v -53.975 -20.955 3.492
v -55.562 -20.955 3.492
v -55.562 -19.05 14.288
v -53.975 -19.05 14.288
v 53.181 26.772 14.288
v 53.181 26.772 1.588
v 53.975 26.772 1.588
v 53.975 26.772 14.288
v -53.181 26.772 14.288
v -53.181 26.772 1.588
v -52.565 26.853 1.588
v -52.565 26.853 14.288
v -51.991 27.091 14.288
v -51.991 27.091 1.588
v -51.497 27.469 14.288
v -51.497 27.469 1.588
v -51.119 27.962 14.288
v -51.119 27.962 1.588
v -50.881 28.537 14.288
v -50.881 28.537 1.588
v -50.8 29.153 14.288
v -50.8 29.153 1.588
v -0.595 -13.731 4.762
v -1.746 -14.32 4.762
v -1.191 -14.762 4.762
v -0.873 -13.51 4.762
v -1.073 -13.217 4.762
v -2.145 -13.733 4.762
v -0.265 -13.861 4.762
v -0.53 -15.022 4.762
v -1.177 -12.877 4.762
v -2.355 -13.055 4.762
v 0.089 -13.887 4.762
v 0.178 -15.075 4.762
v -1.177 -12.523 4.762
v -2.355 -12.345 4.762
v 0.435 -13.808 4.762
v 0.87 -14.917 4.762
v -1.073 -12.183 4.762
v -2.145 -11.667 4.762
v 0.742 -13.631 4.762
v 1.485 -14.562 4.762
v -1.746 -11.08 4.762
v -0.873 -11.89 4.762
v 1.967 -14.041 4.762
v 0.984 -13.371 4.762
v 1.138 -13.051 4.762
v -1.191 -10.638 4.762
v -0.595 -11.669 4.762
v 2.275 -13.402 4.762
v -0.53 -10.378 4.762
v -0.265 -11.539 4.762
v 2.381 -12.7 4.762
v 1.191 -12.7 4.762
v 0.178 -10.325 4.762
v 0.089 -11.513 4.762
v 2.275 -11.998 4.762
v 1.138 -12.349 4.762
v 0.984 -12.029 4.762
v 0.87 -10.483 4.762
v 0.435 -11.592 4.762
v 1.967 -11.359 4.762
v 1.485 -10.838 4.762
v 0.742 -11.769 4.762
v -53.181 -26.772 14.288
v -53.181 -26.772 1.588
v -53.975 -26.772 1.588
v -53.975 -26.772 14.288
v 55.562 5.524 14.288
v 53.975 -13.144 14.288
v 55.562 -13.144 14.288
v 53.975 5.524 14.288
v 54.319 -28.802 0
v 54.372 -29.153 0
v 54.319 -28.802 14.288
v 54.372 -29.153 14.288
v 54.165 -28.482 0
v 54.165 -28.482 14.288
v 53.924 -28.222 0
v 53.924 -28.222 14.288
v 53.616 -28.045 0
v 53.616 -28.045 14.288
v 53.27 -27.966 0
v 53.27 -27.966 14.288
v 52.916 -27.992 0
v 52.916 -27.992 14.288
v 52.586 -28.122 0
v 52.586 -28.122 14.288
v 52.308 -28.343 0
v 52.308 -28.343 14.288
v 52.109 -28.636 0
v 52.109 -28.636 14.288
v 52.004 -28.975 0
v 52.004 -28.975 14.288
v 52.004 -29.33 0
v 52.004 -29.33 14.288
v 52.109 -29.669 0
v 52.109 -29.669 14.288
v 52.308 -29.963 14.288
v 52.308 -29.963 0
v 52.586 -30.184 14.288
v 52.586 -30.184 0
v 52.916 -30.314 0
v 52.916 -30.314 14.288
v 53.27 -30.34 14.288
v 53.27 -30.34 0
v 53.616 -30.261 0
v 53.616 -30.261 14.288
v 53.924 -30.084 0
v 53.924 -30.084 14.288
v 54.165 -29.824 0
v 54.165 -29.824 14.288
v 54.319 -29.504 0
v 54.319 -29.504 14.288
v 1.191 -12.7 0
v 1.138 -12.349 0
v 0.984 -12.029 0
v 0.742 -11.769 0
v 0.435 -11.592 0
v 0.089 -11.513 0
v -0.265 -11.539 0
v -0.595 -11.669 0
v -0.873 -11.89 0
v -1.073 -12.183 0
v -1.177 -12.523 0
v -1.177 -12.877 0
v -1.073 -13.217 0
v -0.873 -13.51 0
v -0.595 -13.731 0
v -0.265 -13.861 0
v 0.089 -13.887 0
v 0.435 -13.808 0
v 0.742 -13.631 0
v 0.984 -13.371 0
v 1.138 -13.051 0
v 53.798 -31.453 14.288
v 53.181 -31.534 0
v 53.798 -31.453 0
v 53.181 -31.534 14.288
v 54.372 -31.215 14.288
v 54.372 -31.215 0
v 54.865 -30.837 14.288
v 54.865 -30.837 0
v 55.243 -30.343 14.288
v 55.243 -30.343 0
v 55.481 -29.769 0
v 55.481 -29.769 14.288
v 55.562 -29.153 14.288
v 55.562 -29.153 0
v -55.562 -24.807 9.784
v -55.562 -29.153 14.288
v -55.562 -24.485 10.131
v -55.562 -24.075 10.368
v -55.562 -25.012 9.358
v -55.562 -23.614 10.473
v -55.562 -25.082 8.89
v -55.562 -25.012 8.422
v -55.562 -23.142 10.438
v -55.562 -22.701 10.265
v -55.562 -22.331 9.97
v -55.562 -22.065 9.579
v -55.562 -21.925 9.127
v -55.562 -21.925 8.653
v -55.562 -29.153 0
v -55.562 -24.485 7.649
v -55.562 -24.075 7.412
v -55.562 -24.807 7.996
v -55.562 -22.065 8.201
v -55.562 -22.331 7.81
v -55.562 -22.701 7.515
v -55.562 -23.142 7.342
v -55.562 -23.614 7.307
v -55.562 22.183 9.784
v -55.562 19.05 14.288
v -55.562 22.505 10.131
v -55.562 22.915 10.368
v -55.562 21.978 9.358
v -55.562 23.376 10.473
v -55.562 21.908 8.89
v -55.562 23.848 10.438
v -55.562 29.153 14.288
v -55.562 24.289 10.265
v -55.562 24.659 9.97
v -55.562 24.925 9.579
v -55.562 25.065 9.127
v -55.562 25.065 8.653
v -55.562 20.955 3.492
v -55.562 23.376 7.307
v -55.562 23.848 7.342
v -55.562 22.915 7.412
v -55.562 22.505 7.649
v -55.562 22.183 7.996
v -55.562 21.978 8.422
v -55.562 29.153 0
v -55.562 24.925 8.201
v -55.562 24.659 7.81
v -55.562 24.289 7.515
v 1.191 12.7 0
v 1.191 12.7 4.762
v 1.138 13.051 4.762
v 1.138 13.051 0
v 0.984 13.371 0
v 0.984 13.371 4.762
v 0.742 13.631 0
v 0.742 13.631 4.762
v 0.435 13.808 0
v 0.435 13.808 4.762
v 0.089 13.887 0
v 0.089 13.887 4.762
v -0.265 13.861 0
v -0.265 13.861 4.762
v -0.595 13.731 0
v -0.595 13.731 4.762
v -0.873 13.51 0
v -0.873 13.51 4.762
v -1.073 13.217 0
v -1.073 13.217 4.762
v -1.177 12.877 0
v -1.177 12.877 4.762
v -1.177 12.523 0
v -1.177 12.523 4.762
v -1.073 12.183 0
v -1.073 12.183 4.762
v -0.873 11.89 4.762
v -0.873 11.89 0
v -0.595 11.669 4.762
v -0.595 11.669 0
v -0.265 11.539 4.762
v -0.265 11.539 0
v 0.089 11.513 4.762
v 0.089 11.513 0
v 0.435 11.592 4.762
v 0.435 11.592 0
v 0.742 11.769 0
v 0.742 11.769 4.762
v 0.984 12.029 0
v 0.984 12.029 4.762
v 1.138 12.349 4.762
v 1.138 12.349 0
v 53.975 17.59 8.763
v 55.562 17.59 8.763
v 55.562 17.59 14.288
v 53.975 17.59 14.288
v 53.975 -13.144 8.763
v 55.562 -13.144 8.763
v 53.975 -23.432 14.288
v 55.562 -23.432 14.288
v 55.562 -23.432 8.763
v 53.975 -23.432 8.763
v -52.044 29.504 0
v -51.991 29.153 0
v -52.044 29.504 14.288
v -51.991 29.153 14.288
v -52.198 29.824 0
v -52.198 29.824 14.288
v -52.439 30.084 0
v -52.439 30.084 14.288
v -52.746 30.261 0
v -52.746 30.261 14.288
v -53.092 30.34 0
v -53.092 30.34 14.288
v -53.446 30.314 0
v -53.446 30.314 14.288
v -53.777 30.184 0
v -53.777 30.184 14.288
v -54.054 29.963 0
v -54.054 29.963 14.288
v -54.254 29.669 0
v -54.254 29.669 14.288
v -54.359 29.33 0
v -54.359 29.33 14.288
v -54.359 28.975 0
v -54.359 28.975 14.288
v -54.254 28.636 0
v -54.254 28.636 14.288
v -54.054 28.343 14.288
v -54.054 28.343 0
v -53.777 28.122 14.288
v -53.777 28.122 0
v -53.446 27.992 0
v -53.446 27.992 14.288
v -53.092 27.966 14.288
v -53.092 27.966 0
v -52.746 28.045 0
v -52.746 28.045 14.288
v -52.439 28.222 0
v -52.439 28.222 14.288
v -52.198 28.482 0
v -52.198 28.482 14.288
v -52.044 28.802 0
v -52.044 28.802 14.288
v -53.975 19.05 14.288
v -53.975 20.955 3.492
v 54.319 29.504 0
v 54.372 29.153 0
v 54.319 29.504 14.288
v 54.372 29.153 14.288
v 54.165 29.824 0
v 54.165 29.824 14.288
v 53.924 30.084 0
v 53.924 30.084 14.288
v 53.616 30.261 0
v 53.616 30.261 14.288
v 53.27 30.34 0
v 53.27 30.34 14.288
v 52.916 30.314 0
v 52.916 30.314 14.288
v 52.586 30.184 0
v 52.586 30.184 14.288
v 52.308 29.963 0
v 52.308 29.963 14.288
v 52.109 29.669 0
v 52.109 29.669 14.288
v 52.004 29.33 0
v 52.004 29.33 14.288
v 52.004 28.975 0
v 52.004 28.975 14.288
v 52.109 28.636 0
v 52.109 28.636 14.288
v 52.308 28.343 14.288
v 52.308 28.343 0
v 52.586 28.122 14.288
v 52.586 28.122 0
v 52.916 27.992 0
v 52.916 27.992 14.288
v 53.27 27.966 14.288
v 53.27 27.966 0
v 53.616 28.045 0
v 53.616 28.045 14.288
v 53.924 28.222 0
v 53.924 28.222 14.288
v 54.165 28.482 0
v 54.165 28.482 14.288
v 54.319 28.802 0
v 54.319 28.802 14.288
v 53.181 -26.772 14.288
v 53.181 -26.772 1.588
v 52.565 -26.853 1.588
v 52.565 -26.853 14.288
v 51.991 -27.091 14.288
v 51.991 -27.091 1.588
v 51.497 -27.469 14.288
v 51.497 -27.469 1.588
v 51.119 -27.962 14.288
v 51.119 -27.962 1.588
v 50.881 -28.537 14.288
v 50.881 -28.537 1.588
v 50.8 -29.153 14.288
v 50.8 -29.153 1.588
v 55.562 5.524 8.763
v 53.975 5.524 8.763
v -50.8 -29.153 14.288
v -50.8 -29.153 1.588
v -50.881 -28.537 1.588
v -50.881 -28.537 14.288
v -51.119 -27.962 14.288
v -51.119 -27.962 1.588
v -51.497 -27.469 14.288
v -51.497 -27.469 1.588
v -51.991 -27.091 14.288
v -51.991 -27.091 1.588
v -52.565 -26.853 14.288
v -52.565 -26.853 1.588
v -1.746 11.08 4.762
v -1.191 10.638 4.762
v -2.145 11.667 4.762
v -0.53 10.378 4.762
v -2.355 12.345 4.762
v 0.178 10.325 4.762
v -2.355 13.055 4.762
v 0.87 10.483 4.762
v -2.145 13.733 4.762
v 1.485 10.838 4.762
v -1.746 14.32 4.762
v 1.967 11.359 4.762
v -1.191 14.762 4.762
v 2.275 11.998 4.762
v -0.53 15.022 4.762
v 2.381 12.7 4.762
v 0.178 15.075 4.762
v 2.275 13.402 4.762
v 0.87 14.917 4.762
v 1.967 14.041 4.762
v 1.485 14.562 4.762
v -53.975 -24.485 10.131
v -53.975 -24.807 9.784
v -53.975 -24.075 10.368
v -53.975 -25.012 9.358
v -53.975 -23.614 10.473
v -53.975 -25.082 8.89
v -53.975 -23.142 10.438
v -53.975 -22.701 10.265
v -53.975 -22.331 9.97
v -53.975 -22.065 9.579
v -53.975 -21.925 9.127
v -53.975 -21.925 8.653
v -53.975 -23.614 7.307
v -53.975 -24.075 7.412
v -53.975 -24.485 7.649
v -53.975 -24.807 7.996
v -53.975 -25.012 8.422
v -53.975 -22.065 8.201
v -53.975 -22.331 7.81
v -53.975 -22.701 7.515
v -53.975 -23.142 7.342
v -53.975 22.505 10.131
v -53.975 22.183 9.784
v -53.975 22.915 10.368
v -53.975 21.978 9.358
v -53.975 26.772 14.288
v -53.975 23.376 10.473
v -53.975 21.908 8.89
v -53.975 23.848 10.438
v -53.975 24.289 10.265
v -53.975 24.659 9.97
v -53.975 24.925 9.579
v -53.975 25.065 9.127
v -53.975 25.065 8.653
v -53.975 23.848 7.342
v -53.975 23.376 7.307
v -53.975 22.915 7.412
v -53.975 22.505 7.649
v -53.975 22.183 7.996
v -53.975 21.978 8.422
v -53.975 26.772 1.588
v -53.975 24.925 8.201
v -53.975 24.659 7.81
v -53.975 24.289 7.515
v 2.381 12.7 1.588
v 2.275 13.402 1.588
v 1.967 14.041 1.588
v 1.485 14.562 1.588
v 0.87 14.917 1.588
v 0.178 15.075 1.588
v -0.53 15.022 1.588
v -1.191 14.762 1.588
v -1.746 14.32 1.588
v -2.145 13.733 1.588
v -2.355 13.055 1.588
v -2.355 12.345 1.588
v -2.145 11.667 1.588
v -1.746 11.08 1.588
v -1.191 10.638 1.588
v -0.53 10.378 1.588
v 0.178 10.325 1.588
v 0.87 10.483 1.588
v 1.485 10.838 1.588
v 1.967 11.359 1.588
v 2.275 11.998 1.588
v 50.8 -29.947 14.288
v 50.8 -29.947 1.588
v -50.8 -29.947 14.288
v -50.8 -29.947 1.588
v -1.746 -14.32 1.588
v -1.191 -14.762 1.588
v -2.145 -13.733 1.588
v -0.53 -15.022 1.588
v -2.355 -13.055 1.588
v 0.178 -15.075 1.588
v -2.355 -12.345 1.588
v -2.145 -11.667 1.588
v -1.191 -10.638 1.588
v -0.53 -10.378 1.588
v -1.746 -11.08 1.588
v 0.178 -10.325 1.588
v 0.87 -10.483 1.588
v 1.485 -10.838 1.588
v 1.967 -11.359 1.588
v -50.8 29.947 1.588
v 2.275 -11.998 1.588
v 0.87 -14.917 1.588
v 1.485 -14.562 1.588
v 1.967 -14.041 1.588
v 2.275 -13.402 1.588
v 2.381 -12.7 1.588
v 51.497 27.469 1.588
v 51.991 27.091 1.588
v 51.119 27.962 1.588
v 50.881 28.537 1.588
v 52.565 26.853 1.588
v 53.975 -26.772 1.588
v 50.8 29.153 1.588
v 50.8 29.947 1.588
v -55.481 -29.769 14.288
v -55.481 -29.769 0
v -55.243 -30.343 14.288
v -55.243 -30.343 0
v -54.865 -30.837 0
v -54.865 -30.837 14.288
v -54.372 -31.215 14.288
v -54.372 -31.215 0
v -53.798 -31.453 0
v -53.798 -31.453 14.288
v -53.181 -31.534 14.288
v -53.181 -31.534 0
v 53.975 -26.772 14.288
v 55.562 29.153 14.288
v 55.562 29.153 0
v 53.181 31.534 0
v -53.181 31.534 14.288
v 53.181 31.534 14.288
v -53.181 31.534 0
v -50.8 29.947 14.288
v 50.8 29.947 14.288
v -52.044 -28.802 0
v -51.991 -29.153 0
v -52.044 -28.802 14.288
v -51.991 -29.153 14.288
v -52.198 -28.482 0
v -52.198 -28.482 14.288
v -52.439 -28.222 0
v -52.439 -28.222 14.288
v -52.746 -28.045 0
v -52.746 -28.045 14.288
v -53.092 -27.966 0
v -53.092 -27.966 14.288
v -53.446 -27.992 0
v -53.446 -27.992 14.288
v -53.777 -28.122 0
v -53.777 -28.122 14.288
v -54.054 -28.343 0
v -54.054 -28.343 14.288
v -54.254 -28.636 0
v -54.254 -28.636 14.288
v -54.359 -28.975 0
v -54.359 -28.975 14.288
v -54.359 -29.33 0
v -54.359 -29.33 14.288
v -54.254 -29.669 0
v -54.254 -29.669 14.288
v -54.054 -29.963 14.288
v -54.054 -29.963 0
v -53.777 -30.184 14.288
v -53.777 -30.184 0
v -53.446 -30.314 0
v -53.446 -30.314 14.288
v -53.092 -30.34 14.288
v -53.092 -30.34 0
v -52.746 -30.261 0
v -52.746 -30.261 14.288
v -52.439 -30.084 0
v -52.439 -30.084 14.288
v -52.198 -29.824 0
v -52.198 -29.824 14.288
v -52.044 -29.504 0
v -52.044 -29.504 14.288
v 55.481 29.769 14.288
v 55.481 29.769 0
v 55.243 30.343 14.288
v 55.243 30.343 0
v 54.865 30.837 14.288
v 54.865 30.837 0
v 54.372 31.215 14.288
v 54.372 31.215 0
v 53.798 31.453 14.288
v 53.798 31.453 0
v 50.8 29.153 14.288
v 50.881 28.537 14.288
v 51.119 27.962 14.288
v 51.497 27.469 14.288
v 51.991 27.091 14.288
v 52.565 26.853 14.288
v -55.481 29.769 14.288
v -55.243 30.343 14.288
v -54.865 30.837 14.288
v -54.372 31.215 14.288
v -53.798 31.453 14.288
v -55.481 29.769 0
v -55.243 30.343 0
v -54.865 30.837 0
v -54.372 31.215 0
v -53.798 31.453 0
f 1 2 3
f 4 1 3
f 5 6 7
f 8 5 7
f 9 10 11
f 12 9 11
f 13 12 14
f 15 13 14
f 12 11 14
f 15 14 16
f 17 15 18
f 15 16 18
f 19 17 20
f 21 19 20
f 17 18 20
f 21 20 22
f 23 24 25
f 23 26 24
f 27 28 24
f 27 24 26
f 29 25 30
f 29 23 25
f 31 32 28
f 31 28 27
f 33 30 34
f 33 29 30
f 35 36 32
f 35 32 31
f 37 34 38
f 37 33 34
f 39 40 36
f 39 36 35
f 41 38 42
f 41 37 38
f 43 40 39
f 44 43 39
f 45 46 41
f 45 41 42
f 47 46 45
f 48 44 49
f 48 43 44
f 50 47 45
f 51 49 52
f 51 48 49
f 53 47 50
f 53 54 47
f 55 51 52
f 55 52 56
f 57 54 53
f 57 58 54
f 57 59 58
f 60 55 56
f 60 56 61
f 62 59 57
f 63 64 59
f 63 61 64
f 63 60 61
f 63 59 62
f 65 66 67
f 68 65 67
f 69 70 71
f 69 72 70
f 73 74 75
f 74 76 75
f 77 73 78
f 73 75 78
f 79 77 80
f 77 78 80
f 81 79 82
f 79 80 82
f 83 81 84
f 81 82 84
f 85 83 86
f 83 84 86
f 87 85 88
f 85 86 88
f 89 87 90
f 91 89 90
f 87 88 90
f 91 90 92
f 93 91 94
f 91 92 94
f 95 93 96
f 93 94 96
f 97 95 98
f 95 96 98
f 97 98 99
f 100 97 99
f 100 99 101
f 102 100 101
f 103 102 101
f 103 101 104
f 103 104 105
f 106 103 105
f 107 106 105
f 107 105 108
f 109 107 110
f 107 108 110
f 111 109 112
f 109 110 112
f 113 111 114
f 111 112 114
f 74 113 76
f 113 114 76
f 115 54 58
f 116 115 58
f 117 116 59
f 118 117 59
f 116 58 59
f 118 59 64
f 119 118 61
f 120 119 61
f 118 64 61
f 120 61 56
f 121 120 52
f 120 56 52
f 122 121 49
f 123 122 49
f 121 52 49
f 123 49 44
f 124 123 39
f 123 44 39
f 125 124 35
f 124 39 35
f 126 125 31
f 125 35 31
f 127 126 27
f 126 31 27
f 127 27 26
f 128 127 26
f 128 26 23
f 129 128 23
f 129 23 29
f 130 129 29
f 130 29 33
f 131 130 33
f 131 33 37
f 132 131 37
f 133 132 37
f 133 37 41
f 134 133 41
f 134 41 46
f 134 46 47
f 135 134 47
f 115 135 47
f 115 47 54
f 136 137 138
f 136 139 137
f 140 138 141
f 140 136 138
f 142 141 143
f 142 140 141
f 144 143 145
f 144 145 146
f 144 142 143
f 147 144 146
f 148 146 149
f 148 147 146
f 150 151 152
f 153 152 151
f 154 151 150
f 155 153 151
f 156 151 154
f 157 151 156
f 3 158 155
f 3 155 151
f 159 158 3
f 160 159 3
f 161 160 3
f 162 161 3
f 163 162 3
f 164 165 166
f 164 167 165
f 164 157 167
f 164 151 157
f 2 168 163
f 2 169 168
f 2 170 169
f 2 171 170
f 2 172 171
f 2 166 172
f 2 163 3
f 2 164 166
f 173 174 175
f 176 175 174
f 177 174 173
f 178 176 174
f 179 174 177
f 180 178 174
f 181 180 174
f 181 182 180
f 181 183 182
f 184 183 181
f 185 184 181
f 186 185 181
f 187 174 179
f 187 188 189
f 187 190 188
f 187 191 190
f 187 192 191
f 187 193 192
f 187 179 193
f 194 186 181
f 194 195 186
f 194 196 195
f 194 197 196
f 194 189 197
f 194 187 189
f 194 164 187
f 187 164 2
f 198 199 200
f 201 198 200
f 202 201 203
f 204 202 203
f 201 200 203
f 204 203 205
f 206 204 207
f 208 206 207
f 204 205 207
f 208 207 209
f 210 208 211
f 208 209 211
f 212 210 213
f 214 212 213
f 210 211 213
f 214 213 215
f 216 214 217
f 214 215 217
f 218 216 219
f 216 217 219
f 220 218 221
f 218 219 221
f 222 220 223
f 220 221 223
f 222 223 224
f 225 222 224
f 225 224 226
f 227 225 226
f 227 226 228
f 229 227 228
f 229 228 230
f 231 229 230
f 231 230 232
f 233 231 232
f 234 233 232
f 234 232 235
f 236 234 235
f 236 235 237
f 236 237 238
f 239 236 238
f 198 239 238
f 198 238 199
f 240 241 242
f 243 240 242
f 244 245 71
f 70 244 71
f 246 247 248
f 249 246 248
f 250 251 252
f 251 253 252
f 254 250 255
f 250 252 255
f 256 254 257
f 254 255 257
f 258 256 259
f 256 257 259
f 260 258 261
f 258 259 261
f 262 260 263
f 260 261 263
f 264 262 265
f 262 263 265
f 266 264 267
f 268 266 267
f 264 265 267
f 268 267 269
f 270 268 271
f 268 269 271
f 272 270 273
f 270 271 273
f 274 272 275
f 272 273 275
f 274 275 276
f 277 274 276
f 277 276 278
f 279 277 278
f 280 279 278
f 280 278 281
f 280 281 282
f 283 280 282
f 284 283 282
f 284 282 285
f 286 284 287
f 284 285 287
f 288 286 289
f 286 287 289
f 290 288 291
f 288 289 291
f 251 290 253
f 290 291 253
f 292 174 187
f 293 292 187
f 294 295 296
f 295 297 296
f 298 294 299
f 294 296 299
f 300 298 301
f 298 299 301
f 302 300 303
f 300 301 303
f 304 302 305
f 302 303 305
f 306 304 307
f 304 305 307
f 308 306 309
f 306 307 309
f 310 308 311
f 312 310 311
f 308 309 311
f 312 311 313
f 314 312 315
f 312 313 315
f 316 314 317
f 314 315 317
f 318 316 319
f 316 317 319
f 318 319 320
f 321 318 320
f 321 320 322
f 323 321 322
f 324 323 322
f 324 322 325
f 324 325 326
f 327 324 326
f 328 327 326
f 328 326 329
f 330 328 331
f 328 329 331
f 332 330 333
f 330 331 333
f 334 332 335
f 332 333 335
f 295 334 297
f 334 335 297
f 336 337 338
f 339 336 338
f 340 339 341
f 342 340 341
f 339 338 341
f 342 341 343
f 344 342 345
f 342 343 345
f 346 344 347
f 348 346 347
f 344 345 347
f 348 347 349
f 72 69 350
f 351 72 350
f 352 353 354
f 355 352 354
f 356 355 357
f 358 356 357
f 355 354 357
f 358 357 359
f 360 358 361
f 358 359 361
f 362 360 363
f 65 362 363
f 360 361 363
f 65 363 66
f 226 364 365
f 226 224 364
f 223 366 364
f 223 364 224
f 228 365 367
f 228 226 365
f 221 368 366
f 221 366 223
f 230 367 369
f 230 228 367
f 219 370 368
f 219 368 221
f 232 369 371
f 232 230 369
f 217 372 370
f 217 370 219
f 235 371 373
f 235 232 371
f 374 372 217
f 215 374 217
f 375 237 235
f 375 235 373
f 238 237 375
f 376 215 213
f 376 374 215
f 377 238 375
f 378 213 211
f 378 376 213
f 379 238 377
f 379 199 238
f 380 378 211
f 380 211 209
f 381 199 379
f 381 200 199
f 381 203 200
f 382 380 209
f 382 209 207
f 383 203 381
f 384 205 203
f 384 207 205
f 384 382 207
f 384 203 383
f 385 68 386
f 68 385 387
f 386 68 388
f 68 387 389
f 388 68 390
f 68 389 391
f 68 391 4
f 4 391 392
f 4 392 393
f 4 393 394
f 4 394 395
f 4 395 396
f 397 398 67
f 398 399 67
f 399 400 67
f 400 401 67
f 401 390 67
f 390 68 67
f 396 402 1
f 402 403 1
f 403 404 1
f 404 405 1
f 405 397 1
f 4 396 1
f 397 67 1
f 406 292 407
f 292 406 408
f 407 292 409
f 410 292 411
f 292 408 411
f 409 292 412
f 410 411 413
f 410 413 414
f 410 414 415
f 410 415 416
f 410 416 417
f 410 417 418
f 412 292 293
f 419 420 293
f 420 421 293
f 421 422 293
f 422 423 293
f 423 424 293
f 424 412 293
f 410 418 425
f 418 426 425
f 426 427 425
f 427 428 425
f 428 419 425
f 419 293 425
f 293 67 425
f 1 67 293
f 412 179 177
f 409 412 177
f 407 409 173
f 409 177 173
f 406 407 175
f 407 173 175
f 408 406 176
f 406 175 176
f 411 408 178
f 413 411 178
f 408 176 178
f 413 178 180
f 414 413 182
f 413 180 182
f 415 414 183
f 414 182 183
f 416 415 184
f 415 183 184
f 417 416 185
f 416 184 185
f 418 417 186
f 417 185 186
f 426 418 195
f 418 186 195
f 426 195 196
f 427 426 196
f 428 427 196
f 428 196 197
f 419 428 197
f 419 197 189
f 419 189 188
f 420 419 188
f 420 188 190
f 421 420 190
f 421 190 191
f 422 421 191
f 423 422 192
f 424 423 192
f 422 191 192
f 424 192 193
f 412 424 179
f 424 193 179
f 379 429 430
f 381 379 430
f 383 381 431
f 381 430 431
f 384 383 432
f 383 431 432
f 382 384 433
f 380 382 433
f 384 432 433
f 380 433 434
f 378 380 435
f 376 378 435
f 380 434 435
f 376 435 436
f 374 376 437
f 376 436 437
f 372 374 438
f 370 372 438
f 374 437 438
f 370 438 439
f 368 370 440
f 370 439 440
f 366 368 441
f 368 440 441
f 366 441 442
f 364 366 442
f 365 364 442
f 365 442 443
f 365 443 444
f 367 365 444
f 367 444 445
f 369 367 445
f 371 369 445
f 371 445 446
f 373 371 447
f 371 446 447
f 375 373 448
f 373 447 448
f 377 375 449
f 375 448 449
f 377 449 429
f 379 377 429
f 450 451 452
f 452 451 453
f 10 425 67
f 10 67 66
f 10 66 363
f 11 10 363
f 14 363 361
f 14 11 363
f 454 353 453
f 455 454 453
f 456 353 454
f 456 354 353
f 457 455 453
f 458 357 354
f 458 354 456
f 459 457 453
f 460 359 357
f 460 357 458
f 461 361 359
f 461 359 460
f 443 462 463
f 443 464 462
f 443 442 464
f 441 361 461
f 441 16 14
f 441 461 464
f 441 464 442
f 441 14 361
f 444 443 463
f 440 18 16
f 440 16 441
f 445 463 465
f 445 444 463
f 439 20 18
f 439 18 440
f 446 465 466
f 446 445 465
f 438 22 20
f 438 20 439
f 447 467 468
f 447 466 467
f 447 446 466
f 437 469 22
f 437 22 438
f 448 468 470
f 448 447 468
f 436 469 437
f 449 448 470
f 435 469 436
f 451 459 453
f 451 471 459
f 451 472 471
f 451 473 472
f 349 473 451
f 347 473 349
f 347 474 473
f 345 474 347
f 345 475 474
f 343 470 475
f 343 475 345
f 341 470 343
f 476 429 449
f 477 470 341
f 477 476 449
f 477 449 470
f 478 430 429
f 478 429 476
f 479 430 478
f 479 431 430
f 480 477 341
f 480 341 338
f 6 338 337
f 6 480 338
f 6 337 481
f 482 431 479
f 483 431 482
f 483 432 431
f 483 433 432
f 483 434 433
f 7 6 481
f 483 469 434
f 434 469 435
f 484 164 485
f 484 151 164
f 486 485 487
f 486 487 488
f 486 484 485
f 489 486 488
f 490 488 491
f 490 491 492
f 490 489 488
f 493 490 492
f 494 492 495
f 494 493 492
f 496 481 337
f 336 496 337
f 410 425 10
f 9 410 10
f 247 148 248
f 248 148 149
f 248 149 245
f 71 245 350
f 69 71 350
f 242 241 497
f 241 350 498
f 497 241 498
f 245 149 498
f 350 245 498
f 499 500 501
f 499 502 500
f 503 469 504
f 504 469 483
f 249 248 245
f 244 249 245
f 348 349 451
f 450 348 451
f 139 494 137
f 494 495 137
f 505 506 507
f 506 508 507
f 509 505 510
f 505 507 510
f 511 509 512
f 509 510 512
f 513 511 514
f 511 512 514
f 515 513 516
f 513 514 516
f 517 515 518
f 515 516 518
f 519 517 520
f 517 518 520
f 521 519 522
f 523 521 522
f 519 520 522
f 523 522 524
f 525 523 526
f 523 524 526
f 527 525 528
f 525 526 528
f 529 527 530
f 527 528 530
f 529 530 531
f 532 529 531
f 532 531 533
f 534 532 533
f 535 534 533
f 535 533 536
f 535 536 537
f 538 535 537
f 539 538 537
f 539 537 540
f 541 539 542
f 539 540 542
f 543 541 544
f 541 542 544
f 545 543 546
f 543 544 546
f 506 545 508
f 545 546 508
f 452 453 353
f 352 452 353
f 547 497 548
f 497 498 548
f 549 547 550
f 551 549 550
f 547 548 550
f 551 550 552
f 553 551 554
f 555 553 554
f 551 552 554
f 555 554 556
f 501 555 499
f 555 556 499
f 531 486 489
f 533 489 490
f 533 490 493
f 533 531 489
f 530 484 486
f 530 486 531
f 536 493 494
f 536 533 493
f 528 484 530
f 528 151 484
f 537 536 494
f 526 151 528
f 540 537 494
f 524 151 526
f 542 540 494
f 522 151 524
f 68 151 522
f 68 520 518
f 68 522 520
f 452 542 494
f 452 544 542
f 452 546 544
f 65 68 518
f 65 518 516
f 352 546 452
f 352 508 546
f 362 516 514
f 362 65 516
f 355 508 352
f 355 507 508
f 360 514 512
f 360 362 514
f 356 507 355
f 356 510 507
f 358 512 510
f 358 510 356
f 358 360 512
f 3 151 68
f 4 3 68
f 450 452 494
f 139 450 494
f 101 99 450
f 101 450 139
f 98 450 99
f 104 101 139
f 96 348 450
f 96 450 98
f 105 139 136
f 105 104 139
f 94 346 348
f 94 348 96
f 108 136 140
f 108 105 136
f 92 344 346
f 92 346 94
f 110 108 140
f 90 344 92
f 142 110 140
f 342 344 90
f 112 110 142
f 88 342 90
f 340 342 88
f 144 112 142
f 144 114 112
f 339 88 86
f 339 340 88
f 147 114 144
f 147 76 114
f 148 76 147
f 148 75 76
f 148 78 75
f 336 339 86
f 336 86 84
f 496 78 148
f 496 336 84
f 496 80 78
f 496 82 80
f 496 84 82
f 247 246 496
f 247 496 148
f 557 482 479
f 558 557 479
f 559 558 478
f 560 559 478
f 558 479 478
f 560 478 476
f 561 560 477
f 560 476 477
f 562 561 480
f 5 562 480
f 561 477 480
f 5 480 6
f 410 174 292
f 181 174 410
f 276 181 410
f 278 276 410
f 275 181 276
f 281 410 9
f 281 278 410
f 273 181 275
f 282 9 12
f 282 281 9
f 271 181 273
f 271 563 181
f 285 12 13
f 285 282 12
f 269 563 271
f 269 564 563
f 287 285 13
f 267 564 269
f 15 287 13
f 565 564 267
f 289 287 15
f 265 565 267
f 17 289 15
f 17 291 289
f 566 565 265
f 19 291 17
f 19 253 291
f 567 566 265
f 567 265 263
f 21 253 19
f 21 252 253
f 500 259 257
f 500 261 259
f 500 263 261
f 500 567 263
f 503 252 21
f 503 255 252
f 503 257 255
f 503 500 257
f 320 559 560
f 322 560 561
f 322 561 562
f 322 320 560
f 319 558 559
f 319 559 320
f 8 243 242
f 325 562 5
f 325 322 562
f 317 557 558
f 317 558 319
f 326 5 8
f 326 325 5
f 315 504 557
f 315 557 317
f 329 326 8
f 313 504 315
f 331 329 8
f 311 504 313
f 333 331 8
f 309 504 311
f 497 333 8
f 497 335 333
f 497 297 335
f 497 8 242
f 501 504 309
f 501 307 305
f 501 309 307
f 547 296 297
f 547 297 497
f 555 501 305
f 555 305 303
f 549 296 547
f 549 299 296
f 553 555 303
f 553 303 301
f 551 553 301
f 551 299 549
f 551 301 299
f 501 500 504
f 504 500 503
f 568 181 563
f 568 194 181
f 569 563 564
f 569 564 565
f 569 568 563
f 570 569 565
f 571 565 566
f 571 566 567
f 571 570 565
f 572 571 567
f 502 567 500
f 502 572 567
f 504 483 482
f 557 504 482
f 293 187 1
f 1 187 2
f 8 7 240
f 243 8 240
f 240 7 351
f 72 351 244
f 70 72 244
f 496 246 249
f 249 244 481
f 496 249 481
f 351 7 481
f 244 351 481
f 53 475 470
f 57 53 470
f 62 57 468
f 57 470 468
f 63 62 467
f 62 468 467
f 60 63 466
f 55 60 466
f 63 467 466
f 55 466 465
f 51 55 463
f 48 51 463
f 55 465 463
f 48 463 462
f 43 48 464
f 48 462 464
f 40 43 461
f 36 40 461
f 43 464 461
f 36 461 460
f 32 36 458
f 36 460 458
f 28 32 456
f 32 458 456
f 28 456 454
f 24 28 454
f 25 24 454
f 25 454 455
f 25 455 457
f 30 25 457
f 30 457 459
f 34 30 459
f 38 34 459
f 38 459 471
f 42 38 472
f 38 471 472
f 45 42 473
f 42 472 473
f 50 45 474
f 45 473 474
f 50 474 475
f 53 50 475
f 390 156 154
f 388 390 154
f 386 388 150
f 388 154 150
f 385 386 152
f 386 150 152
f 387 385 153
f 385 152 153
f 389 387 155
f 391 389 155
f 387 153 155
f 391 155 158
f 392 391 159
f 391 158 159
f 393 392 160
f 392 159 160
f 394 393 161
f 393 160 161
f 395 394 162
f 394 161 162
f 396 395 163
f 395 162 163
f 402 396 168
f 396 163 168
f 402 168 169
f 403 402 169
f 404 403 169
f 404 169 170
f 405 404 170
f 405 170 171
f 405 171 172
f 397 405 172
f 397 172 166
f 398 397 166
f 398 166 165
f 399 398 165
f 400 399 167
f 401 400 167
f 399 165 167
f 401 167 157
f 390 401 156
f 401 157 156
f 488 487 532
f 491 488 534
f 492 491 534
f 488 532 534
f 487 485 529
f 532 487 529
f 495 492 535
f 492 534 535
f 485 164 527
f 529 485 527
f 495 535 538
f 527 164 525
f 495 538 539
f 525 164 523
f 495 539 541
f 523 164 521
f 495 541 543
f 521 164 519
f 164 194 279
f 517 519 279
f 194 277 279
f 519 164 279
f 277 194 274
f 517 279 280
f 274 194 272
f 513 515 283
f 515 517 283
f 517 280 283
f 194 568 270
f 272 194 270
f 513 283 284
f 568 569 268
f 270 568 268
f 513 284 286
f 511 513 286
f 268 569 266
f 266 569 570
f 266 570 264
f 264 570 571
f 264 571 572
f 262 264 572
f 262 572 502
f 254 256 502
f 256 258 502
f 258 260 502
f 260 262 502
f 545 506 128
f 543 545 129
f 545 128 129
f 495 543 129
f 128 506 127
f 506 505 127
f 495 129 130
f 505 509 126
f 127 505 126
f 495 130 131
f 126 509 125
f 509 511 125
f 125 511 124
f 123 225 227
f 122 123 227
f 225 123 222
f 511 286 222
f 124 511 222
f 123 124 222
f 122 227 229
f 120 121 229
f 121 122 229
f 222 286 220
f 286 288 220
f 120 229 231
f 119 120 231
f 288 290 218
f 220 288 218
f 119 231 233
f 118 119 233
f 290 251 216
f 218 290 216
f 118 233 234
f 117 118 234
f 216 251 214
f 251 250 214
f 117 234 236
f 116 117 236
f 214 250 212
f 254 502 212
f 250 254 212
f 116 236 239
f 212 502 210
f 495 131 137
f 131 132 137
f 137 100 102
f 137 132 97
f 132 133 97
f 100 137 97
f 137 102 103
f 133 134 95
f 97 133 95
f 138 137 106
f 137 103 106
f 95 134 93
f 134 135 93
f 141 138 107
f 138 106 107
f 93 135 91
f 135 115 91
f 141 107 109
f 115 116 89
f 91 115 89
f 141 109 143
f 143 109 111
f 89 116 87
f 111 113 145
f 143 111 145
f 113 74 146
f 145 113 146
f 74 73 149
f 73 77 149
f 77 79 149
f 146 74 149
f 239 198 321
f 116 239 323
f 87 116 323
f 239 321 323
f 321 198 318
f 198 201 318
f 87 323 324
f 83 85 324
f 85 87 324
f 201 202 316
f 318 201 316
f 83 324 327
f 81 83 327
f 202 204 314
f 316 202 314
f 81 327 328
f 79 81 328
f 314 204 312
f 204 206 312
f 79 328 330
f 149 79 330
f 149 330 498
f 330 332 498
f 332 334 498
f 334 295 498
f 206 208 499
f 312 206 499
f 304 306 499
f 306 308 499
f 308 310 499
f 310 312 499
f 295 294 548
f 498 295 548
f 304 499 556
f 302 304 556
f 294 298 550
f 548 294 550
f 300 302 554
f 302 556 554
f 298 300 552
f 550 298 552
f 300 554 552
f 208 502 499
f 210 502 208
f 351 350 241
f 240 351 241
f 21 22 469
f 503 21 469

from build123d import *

# Parameters (mm, degrees)
F1_W      = 111.125
F1_H      = 63.0682
F2_DEPTH  = 1.5875
F3_W      = 111.125
F3_H      = 63.0682
F3_R      = 1.190625
F4_DEPTH  = 12.7
F5_R      = 2.38125
F7_DEPTH  = 1.5875
F9_R      = 1.5875
F10_DEPTH = 1.5875
F11_R     = 2.38125
F12_DEPTH = 3.175
F13_R     = 1.190625
F14_DEPTH = 4.7635
F15_R     = 1.190625
F16_DEPTH = 14.2885


with BuildPart() as f2:
    # F1 (on Top) → F2 (new body)
    with BuildSketch(Plane.XY):
        Rectangle(F1_W, F1_H)
    extrude(amount=F2_DEPTH)

    # F3 (on face) → F4 (join)
    with BuildSketch(Plane.XY.offset(1.5875)):
        Rectangle(F3_W, F3_H)
        with Locations((-53.18125, -29.15285)):
            Circle(F3_R, mode=Mode.SUBTRACT)
        with Locations((53.18125, -29.15285)):
            Circle(F3_R, mode=Mode.SUBTRACT)
        with BuildLine():
            Line((53.18125, 26.7716), (53.975, 26.7716))
            Line((53.975, 26.7716), (53.975, -26.7716))
            Line((53.975, -26.7716), (53.18125, -26.7716))
            ThreePointArc((53.18125, -26.7716), (51.497452, -27.469052), (50.8, -29.15285))
            Line((50.8, -29.15285), (50.8, -29.9466))
            Line((50.8, -29.9466), (-50.8, -29.9466))
            Line((-50.8, -29.9466), (-50.8, -29.15285))
            ThreePointArc((-50.8, -29.15285), (-51.497452, -27.469052), (-53.18125, -26.7716))
            Line((-53.18125, -26.7716), (-53.975, -26.7716))
            Line((-53.975, -26.7716), (-53.975, 26.7716))
            Line((-53.975, 26.7716), (-53.18125, 26.7716))
            ThreePointArc((-53.18125, 26.7716), (-51.497452, 27.469052), (-50.8, 29.15285))
            Line((-50.8, 29.15285), (-50.8, 29.9466))
            Line((-50.8, 29.9466), (50.8, 29.9466))
            Line((50.8, 29.9466), (50.8, 29.15285))
            ThreePointArc((50.8, 29.15285), (51.497452, 27.469052), (53.18125, 26.7716))
        make_face(mode=Mode.SUBTRACT)
        with Locations((-53.18125, 29.15285)):
            Circle(F3_R, mode=Mode.SUBTRACT)
        with Locations((53.18125, 29.15285)):
            Circle(F3_R, mode=Mode.SUBTRACT)
    extrude(amount=F4_DEPTH)

    # F5
    f5_edges = [f2.edges().sort_by_distance(p)[0] for p in [
        (55.5625, -31.5341, 7.14375),
        (55.5625, 31.5341, 7.14375),
        (-55.5625, -31.5341, 7.14375),
        (-55.5625, 31.5341, 7.14375),
    ]]
    fillet(f5_edges, radius=F5_R)

    # F6 (on face) → F7 (cut, through all)
    with BuildSketch(Plane.YZ.offset(55.5625)):
        Polygon((-13.1445, 14.2875), (-17.5895, 14.2875), (-23.4315, 14.2875), (-23.4315, 8.763), (-17.5895, 8.763), (-13.1445, 8.763), align=None)
        Polygon((5.5245, 8.763), (13.1445, 8.763), (17.5895, 8.763), (17.5895, 14.2875), (5.5245, 14.2875), align=None)
    extrude(amount=-F7_DEPTH, mode=Mode.SUBTRACT)

    # F9 (on face) → F10 (cut, through all)
    with BuildSketch(Plane(origin=(-55.5625, 0, 0), x_dir=(0, -1, 0), z_dir=(-1, 0, 0))):
        Polygon((19.05, 14.2875), (-19.05, 14.2875), (-20.955, 3.4925), (20.955, 3.4925), align=None)
        with Locations((-23.495, 8.89)):
            Circle(F9_R)
        with Locations((23.495, 8.89)):
            Circle(F9_R)
    extrude(amount=-F10_DEPTH, mode=Mode.SUBTRACT)

    # F11 (on face) → F12 (join)
    with BuildSketch(Plane.XY.offset(1.5875)):
        with Locations((0, 12.7)):
            Circle(F11_R)
        with Locations((0, -12.7)):
            Circle(F11_R)
    extrude(amount=F12_DEPTH)

    # F13 (on face) → F14 (cut, through all)
    with BuildSketch(Plane.XY.offset(4.7625)):
        with Locations((0, 12.7)):
            Circle(F13_R)
        with Locations((0, -12.7)):
            Circle(F13_R)
    extrude(amount=-F14_DEPTH, mode=Mode.SUBTRACT)

    # F15 (on face) → F16 (cut, through all)
    with BuildSketch(Plane.XY.offset(14.2875)):
        with Locations((53.18125, 29.15285)):
            Circle(F15_R)
        with Locations((53.18125, -29.15285)):
            Circle(F15_R)
        with Locations((-53.18125, -29.15285)):
            Circle(F15_R)
        with Locations((-53.18125, 29.15285)):
            Circle(F15_R)
    extrude(amount=-F16_DEPTH, mode=Mode.SUBTRACT)


solid = f2.part
